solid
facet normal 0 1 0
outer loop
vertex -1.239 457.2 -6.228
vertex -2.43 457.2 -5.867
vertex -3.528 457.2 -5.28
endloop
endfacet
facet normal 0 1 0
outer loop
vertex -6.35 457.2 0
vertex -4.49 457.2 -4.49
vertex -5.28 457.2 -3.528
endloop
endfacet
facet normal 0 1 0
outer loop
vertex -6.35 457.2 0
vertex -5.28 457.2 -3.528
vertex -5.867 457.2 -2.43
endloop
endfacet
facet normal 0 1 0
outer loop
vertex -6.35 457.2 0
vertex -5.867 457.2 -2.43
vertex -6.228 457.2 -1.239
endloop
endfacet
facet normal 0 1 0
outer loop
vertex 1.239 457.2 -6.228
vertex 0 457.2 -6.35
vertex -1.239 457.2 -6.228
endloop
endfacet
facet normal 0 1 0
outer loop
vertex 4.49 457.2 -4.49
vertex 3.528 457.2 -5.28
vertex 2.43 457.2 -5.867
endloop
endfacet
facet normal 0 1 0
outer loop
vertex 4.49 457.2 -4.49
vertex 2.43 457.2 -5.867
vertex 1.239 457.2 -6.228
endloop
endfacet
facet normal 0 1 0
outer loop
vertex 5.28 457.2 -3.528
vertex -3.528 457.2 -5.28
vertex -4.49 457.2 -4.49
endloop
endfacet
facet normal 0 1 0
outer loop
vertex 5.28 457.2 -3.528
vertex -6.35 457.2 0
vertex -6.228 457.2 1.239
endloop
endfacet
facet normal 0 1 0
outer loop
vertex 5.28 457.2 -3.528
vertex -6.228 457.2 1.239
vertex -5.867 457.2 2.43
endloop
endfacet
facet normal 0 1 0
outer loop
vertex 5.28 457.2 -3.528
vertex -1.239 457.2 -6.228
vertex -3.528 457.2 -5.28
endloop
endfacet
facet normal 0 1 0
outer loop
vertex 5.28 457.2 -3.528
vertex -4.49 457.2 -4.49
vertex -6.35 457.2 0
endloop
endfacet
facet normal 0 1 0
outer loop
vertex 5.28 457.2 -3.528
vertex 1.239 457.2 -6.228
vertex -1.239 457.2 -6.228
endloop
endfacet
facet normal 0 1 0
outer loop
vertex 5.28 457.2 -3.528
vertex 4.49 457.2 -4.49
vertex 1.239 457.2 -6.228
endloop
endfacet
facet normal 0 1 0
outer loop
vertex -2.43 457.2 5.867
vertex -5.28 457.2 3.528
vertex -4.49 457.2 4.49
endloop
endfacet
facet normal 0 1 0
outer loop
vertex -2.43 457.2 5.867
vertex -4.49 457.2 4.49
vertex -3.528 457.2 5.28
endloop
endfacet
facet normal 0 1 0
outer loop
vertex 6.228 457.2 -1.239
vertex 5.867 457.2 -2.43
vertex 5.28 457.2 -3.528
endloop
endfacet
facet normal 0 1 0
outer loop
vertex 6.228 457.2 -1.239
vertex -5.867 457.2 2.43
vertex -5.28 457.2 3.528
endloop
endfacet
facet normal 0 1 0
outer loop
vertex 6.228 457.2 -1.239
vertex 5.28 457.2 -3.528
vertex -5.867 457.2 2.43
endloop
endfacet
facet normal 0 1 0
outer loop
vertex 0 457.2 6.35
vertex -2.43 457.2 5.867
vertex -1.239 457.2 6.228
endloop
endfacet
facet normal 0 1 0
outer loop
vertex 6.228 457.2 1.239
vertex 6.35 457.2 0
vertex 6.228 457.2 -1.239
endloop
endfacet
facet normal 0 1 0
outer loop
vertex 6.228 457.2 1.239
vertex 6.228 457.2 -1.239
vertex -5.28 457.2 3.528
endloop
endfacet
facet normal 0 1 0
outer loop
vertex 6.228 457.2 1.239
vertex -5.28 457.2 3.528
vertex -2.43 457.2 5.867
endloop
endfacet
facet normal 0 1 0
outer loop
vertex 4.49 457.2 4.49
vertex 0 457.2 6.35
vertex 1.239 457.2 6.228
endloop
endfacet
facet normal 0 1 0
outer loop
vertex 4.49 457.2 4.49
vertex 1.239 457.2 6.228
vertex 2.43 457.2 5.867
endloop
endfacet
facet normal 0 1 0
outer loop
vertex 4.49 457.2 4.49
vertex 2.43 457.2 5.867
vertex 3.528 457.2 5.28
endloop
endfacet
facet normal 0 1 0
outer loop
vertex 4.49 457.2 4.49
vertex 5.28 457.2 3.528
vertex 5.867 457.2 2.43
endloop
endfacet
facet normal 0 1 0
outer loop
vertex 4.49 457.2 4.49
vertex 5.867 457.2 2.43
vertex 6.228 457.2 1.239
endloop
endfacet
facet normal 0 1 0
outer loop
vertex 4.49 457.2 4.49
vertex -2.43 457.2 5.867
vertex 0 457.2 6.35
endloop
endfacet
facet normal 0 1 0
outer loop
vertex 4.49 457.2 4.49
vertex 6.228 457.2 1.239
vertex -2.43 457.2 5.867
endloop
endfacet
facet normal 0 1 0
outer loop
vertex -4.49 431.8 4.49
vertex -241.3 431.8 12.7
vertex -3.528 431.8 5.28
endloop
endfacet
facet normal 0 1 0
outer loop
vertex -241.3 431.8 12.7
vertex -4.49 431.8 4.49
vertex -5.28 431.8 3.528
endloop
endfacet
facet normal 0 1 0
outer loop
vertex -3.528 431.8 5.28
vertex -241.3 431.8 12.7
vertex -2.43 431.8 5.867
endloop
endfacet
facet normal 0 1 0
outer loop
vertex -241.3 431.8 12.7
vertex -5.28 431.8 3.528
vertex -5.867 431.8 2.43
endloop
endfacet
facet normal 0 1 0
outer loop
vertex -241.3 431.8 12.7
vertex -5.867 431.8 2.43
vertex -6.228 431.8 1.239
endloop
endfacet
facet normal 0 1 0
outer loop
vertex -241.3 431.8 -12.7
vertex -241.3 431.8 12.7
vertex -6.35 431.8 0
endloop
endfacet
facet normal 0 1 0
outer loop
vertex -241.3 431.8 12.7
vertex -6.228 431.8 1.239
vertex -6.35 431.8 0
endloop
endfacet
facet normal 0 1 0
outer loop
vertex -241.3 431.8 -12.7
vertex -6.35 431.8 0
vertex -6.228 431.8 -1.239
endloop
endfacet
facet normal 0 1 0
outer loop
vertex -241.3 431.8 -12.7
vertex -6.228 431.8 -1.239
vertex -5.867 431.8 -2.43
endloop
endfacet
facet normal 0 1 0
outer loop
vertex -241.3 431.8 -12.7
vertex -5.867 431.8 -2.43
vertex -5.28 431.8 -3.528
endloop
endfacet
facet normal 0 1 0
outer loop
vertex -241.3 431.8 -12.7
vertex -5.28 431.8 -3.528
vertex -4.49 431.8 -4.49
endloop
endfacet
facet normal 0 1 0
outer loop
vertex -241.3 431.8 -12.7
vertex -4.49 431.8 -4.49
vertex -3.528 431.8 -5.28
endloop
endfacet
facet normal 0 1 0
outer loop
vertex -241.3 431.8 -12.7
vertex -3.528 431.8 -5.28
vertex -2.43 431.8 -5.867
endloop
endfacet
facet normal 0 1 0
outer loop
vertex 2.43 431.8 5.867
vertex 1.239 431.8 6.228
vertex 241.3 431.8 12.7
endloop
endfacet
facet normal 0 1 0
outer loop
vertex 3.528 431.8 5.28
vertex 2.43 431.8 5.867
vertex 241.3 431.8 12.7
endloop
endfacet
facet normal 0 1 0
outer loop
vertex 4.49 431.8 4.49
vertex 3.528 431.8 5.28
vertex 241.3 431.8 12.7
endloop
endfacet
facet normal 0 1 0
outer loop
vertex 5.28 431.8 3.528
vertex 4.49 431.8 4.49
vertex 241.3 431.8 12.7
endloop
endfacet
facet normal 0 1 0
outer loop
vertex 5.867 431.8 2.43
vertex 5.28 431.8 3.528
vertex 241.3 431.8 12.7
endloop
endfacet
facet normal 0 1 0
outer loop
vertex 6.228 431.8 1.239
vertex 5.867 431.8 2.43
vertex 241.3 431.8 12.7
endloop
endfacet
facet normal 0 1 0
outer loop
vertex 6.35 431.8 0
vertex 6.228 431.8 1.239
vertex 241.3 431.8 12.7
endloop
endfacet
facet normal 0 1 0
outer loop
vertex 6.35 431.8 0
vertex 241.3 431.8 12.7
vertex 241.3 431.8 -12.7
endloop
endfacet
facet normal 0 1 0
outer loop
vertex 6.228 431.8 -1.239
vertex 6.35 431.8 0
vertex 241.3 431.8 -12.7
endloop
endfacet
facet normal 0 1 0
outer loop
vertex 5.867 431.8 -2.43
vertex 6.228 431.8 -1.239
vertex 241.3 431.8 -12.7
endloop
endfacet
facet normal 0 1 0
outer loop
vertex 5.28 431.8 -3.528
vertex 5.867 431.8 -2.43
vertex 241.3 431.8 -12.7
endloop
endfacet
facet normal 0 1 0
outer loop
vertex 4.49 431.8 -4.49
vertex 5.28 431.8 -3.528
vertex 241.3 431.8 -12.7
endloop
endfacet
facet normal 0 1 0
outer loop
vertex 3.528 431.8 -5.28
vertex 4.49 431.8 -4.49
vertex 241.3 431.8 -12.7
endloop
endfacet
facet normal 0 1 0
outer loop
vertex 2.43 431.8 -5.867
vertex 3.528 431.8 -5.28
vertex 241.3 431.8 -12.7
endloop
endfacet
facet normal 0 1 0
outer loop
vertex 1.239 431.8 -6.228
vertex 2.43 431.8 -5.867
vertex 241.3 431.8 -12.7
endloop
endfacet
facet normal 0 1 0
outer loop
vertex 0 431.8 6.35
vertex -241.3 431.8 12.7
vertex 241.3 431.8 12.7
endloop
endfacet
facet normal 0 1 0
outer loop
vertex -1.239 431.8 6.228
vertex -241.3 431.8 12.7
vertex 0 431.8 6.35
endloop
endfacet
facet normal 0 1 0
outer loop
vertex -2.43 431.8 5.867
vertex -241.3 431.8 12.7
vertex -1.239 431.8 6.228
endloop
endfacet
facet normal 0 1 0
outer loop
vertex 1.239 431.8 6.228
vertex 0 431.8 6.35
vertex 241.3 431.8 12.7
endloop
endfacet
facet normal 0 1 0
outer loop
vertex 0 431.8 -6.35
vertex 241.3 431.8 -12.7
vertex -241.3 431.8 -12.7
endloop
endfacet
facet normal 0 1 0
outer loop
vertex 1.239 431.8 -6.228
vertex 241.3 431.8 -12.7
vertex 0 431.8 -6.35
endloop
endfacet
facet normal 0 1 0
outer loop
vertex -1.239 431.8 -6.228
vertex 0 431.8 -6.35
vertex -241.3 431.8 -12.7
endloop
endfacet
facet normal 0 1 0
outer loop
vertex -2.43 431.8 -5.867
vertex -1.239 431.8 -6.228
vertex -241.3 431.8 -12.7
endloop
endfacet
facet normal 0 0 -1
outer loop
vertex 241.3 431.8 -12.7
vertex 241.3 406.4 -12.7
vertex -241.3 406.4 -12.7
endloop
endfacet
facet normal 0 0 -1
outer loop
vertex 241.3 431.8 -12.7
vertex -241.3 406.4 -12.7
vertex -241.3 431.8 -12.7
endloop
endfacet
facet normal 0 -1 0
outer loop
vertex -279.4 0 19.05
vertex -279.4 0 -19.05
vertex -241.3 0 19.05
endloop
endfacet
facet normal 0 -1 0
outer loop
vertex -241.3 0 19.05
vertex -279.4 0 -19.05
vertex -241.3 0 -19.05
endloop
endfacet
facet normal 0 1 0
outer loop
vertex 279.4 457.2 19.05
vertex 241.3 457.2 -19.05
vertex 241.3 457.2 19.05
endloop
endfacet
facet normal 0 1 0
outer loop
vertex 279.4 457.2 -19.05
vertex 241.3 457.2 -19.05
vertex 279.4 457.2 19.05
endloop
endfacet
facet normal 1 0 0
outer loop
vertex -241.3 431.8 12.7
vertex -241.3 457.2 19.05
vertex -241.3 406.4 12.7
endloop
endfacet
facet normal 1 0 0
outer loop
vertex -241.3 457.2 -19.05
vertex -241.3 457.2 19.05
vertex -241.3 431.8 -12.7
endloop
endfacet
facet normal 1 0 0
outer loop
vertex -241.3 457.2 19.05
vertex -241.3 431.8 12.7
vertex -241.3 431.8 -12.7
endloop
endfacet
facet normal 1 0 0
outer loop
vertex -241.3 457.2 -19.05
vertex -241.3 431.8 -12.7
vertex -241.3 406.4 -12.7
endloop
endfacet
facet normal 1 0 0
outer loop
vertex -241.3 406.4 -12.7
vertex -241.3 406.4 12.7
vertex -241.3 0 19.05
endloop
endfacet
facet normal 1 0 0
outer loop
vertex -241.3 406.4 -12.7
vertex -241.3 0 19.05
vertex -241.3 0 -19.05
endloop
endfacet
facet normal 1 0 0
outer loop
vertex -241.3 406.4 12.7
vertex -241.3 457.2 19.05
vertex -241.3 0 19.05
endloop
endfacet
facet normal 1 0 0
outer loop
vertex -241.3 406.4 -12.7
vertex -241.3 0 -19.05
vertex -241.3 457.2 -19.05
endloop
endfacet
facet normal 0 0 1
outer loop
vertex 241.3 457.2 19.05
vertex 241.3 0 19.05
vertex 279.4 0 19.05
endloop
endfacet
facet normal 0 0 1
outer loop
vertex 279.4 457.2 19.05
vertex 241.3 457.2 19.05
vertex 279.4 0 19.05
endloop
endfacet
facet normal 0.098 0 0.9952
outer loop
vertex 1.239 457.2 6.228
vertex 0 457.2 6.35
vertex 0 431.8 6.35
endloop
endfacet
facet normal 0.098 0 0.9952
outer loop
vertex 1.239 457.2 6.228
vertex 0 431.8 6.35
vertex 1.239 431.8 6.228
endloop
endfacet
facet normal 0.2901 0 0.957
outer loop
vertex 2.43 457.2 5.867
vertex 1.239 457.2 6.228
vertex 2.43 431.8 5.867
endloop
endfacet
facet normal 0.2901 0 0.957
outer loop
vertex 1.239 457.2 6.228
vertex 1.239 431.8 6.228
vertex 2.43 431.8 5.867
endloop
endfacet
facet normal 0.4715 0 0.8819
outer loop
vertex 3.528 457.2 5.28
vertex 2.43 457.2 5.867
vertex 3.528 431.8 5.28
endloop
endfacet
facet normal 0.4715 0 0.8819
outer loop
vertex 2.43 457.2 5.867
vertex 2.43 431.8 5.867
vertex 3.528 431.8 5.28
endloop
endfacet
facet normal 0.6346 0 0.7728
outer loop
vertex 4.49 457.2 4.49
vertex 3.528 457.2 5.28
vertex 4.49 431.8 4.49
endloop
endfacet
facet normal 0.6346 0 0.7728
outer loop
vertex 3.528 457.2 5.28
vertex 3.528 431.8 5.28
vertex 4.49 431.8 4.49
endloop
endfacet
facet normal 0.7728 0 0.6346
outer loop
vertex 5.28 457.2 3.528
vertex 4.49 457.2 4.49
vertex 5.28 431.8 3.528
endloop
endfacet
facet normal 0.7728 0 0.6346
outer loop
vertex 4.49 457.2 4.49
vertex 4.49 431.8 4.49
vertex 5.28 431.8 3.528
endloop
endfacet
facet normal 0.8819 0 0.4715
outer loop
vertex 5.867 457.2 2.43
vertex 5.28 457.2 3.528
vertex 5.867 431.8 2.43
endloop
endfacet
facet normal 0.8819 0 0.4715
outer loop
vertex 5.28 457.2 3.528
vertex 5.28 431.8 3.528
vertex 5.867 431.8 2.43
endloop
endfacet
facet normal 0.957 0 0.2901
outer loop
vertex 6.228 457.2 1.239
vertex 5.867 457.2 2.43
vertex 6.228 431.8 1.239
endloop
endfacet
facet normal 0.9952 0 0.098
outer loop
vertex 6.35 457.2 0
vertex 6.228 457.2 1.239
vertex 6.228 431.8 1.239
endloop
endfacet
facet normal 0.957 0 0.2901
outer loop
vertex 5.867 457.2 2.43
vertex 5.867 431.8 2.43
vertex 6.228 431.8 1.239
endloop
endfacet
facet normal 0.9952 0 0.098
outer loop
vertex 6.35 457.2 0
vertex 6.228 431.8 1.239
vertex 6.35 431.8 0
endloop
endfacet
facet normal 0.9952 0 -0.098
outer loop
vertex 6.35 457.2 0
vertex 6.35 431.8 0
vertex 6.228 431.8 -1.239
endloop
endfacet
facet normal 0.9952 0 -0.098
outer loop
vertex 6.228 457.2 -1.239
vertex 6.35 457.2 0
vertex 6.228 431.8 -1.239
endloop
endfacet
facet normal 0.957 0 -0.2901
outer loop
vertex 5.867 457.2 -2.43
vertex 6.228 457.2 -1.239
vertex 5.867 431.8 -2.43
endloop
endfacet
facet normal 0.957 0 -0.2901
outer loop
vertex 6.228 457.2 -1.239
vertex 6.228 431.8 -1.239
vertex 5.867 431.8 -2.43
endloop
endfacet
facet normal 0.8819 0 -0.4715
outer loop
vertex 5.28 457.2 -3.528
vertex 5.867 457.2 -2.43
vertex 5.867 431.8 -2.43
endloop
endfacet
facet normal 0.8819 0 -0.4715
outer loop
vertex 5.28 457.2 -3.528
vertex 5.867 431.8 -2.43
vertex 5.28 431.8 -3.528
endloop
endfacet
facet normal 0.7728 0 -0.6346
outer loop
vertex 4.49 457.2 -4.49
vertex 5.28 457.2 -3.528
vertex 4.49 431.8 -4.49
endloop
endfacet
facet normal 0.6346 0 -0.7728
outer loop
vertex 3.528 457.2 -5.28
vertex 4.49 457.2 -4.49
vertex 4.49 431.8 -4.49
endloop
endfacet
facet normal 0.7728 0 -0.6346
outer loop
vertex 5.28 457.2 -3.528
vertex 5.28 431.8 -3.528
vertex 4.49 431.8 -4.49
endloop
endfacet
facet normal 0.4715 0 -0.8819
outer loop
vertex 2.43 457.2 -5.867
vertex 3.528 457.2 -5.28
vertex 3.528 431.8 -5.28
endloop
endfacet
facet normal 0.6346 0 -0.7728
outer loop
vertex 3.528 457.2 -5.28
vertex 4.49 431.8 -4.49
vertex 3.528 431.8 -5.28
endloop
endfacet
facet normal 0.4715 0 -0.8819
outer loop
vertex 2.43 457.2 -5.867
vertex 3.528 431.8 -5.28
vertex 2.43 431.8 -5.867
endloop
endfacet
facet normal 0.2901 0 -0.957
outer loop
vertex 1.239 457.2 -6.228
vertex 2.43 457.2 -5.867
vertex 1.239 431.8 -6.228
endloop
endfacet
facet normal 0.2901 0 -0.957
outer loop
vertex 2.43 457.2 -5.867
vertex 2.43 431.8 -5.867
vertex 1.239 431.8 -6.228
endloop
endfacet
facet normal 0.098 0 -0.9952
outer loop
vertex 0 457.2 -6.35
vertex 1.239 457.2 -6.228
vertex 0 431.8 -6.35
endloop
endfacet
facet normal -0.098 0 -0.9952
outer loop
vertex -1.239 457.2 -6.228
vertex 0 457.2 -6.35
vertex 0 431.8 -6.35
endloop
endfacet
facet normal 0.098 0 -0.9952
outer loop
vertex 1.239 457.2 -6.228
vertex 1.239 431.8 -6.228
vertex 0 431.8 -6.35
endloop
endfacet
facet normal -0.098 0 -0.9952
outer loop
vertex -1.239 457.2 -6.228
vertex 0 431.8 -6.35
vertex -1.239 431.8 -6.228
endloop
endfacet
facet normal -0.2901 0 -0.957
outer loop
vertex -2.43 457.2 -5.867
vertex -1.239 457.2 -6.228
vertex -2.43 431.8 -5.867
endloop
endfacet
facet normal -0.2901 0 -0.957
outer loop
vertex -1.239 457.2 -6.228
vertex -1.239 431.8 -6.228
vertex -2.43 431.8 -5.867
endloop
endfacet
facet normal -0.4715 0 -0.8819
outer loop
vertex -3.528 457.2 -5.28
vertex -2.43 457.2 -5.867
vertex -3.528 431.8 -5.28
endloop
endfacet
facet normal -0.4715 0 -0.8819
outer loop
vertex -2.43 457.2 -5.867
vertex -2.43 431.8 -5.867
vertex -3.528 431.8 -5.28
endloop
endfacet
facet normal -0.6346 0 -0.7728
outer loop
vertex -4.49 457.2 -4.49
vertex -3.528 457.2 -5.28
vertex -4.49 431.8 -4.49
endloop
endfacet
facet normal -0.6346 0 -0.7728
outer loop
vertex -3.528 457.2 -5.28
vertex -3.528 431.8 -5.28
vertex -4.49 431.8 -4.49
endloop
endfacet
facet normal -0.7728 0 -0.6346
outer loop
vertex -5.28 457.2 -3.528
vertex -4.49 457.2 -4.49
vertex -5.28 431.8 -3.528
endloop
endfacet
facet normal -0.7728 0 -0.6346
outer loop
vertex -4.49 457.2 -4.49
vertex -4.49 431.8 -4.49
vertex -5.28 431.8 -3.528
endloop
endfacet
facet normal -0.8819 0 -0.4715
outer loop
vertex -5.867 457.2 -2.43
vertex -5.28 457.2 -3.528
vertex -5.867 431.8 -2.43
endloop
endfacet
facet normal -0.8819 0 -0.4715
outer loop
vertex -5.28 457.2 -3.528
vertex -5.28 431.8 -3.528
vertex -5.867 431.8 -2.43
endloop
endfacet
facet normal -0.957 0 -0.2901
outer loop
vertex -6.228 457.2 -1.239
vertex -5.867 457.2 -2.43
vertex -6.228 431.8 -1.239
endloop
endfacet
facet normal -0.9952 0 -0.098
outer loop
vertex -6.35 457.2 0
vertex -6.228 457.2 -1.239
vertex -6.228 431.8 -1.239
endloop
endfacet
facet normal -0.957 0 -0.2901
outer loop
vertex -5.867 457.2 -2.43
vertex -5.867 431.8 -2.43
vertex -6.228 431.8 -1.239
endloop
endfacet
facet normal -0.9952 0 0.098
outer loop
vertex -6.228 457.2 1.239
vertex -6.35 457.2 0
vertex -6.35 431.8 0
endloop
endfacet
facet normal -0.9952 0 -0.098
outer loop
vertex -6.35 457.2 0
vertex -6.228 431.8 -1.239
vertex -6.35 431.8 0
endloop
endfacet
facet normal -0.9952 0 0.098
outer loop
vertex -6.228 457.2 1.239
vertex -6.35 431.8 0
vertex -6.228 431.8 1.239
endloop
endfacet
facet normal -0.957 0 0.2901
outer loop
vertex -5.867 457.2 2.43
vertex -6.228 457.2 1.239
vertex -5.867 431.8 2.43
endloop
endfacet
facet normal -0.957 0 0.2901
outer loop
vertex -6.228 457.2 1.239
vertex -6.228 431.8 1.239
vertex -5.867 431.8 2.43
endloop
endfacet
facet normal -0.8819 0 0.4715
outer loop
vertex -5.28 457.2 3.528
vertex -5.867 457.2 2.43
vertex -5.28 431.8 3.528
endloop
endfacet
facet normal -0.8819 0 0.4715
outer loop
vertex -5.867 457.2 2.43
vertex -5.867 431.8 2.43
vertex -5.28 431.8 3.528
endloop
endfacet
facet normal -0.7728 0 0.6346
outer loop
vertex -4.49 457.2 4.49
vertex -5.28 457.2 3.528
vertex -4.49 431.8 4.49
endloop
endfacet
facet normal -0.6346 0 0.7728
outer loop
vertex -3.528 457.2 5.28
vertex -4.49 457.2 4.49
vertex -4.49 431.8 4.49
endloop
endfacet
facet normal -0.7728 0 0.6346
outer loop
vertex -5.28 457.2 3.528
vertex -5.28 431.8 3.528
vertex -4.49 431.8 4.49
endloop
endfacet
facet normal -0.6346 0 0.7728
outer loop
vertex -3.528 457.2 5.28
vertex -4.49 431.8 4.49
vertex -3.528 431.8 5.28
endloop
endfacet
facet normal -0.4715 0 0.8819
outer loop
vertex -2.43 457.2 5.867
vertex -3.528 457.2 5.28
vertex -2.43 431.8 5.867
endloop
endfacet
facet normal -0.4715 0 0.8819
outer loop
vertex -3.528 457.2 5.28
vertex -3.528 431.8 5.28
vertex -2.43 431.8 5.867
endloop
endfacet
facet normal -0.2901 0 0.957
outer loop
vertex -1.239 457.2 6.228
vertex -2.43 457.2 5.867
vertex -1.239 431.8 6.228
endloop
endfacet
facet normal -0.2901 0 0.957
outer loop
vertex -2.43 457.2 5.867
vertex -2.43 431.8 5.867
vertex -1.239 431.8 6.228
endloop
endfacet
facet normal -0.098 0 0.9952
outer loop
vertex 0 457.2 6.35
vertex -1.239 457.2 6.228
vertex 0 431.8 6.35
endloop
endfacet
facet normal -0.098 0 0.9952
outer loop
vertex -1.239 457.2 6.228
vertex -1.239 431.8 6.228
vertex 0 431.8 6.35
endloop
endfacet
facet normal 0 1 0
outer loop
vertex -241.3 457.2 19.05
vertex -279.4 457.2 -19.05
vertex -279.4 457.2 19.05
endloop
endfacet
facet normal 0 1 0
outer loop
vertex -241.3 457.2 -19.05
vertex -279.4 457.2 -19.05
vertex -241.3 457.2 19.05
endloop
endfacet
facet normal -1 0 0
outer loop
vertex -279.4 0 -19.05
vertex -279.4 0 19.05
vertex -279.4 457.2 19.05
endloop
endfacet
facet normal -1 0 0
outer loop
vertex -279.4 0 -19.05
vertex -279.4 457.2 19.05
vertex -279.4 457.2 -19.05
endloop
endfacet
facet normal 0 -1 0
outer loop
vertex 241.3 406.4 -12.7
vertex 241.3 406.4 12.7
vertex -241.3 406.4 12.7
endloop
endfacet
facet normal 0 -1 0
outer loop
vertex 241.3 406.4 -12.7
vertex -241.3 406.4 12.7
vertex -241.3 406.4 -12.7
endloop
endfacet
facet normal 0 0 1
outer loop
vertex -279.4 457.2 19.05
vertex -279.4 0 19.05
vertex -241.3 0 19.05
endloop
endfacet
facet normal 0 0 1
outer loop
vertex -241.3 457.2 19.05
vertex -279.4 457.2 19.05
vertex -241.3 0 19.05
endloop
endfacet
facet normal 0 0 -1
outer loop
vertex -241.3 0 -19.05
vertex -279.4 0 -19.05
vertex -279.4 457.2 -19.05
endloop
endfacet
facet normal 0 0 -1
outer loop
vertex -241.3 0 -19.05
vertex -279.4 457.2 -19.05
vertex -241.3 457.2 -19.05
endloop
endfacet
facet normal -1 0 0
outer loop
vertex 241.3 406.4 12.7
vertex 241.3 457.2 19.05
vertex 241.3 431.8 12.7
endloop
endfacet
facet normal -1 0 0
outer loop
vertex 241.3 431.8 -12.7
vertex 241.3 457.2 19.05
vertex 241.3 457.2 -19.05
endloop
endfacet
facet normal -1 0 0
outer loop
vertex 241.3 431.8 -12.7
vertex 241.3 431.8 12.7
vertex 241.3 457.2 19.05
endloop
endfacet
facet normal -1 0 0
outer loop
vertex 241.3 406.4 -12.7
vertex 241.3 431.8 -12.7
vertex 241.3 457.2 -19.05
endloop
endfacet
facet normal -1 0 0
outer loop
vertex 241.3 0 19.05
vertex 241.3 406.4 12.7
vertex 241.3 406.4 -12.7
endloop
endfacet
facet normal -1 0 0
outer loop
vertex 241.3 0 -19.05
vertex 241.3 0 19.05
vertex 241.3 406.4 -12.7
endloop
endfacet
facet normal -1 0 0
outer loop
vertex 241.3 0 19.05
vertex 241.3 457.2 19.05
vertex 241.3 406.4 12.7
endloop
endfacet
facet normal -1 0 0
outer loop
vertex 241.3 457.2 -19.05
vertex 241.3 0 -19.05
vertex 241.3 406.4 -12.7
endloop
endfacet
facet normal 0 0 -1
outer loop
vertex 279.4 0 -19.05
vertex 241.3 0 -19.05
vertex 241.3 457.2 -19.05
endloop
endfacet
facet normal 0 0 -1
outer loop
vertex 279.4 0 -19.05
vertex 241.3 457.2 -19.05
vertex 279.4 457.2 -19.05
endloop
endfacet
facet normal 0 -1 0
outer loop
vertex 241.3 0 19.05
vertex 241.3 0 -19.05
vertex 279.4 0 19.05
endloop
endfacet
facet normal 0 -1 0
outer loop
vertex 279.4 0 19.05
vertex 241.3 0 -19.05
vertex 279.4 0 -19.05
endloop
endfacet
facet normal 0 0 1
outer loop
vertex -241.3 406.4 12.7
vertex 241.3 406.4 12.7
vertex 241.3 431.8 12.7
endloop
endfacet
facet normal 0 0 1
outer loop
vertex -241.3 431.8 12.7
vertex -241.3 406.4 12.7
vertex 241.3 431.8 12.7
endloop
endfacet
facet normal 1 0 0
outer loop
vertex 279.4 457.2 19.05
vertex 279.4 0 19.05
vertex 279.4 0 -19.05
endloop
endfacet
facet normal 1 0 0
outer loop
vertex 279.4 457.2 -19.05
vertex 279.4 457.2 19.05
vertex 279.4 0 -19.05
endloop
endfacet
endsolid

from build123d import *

# Parameters (mm, degrees)
SKETCH1_W             = 38.1
SKETCH1_H             = 38.1
BOSS_EXTRUDE1_DEPTH   = 457.2
BOSS_EXTRUDE1_2_DEPTH = 457.2
SKETCH2_W             = 25.4
SKETCH2_H             = 25.4
BOSS_EXTRUDE2_DEPTH   = 521.97
BOSS_EXTRUDE3_START   = 431.8
SKETCH3_R             = 6.35
BOSS_EXTRUDE3_DEPTH   = 25.4


with BuildPart() as part:
    # Sketch1 → Boss-Extrude1 (new body)
    with BuildSketch(Plane(origin=(0, 0, 0), x_dir=(1, 0, 0), z_dir=(0, 1, 0))):
        with Locations((-260.35, 0)):
            Rectangle(SKETCH1_W, SKETCH1_H)
    extrude(amount=BOSS_EXTRUDE1_DEPTH)



with BuildPart() as body_2:
    # Sketch1 → Boss-Extrude1 2 (new body)
    with BuildSketch(Plane(origin=(0, 0, 0), x_dir=(1, 0, 0), z_dir=(0, 1, 0))):
        with Locations((260.35, 0)):
            Rectangle(SKETCH1_W, SKETCH1_H)
    extrude(amount=BOSS_EXTRUDE1_2_DEPTH)


with BuildPart() as part_1:
    add(part.part)

    add(body_2.part)  # Boss-Extrude2 merges body 2
    # Sketch2 → Boss-Extrude2 (add)
    with BuildSketch(Plane(origin=(279.4, 0, 0), x_dir=(0, 0, -1), z_dir=(1, 0, 0))):
        with Locations((0, 419.1)):
            Rectangle(SKETCH2_W, SKETCH2_H)
    extrude(amount=-BOSS_EXTRUDE2_DEPTH)

    # Sketch3 → Boss-Extrude3 (add)
    with BuildSketch(Plane(origin=(0, 0, 0), x_dir=(1, 0, 0), z_dir=(0, 1, 0)).offset(BOSS_EXTRUDE3_START)):
        with Locations(Location((0, 0, 0), (0, 0, 270))):
            Circle(SKETCH3_R)
    extrude(amount=BOSS_EXTRUDE3_DEPTH)


solid = part_1.part
